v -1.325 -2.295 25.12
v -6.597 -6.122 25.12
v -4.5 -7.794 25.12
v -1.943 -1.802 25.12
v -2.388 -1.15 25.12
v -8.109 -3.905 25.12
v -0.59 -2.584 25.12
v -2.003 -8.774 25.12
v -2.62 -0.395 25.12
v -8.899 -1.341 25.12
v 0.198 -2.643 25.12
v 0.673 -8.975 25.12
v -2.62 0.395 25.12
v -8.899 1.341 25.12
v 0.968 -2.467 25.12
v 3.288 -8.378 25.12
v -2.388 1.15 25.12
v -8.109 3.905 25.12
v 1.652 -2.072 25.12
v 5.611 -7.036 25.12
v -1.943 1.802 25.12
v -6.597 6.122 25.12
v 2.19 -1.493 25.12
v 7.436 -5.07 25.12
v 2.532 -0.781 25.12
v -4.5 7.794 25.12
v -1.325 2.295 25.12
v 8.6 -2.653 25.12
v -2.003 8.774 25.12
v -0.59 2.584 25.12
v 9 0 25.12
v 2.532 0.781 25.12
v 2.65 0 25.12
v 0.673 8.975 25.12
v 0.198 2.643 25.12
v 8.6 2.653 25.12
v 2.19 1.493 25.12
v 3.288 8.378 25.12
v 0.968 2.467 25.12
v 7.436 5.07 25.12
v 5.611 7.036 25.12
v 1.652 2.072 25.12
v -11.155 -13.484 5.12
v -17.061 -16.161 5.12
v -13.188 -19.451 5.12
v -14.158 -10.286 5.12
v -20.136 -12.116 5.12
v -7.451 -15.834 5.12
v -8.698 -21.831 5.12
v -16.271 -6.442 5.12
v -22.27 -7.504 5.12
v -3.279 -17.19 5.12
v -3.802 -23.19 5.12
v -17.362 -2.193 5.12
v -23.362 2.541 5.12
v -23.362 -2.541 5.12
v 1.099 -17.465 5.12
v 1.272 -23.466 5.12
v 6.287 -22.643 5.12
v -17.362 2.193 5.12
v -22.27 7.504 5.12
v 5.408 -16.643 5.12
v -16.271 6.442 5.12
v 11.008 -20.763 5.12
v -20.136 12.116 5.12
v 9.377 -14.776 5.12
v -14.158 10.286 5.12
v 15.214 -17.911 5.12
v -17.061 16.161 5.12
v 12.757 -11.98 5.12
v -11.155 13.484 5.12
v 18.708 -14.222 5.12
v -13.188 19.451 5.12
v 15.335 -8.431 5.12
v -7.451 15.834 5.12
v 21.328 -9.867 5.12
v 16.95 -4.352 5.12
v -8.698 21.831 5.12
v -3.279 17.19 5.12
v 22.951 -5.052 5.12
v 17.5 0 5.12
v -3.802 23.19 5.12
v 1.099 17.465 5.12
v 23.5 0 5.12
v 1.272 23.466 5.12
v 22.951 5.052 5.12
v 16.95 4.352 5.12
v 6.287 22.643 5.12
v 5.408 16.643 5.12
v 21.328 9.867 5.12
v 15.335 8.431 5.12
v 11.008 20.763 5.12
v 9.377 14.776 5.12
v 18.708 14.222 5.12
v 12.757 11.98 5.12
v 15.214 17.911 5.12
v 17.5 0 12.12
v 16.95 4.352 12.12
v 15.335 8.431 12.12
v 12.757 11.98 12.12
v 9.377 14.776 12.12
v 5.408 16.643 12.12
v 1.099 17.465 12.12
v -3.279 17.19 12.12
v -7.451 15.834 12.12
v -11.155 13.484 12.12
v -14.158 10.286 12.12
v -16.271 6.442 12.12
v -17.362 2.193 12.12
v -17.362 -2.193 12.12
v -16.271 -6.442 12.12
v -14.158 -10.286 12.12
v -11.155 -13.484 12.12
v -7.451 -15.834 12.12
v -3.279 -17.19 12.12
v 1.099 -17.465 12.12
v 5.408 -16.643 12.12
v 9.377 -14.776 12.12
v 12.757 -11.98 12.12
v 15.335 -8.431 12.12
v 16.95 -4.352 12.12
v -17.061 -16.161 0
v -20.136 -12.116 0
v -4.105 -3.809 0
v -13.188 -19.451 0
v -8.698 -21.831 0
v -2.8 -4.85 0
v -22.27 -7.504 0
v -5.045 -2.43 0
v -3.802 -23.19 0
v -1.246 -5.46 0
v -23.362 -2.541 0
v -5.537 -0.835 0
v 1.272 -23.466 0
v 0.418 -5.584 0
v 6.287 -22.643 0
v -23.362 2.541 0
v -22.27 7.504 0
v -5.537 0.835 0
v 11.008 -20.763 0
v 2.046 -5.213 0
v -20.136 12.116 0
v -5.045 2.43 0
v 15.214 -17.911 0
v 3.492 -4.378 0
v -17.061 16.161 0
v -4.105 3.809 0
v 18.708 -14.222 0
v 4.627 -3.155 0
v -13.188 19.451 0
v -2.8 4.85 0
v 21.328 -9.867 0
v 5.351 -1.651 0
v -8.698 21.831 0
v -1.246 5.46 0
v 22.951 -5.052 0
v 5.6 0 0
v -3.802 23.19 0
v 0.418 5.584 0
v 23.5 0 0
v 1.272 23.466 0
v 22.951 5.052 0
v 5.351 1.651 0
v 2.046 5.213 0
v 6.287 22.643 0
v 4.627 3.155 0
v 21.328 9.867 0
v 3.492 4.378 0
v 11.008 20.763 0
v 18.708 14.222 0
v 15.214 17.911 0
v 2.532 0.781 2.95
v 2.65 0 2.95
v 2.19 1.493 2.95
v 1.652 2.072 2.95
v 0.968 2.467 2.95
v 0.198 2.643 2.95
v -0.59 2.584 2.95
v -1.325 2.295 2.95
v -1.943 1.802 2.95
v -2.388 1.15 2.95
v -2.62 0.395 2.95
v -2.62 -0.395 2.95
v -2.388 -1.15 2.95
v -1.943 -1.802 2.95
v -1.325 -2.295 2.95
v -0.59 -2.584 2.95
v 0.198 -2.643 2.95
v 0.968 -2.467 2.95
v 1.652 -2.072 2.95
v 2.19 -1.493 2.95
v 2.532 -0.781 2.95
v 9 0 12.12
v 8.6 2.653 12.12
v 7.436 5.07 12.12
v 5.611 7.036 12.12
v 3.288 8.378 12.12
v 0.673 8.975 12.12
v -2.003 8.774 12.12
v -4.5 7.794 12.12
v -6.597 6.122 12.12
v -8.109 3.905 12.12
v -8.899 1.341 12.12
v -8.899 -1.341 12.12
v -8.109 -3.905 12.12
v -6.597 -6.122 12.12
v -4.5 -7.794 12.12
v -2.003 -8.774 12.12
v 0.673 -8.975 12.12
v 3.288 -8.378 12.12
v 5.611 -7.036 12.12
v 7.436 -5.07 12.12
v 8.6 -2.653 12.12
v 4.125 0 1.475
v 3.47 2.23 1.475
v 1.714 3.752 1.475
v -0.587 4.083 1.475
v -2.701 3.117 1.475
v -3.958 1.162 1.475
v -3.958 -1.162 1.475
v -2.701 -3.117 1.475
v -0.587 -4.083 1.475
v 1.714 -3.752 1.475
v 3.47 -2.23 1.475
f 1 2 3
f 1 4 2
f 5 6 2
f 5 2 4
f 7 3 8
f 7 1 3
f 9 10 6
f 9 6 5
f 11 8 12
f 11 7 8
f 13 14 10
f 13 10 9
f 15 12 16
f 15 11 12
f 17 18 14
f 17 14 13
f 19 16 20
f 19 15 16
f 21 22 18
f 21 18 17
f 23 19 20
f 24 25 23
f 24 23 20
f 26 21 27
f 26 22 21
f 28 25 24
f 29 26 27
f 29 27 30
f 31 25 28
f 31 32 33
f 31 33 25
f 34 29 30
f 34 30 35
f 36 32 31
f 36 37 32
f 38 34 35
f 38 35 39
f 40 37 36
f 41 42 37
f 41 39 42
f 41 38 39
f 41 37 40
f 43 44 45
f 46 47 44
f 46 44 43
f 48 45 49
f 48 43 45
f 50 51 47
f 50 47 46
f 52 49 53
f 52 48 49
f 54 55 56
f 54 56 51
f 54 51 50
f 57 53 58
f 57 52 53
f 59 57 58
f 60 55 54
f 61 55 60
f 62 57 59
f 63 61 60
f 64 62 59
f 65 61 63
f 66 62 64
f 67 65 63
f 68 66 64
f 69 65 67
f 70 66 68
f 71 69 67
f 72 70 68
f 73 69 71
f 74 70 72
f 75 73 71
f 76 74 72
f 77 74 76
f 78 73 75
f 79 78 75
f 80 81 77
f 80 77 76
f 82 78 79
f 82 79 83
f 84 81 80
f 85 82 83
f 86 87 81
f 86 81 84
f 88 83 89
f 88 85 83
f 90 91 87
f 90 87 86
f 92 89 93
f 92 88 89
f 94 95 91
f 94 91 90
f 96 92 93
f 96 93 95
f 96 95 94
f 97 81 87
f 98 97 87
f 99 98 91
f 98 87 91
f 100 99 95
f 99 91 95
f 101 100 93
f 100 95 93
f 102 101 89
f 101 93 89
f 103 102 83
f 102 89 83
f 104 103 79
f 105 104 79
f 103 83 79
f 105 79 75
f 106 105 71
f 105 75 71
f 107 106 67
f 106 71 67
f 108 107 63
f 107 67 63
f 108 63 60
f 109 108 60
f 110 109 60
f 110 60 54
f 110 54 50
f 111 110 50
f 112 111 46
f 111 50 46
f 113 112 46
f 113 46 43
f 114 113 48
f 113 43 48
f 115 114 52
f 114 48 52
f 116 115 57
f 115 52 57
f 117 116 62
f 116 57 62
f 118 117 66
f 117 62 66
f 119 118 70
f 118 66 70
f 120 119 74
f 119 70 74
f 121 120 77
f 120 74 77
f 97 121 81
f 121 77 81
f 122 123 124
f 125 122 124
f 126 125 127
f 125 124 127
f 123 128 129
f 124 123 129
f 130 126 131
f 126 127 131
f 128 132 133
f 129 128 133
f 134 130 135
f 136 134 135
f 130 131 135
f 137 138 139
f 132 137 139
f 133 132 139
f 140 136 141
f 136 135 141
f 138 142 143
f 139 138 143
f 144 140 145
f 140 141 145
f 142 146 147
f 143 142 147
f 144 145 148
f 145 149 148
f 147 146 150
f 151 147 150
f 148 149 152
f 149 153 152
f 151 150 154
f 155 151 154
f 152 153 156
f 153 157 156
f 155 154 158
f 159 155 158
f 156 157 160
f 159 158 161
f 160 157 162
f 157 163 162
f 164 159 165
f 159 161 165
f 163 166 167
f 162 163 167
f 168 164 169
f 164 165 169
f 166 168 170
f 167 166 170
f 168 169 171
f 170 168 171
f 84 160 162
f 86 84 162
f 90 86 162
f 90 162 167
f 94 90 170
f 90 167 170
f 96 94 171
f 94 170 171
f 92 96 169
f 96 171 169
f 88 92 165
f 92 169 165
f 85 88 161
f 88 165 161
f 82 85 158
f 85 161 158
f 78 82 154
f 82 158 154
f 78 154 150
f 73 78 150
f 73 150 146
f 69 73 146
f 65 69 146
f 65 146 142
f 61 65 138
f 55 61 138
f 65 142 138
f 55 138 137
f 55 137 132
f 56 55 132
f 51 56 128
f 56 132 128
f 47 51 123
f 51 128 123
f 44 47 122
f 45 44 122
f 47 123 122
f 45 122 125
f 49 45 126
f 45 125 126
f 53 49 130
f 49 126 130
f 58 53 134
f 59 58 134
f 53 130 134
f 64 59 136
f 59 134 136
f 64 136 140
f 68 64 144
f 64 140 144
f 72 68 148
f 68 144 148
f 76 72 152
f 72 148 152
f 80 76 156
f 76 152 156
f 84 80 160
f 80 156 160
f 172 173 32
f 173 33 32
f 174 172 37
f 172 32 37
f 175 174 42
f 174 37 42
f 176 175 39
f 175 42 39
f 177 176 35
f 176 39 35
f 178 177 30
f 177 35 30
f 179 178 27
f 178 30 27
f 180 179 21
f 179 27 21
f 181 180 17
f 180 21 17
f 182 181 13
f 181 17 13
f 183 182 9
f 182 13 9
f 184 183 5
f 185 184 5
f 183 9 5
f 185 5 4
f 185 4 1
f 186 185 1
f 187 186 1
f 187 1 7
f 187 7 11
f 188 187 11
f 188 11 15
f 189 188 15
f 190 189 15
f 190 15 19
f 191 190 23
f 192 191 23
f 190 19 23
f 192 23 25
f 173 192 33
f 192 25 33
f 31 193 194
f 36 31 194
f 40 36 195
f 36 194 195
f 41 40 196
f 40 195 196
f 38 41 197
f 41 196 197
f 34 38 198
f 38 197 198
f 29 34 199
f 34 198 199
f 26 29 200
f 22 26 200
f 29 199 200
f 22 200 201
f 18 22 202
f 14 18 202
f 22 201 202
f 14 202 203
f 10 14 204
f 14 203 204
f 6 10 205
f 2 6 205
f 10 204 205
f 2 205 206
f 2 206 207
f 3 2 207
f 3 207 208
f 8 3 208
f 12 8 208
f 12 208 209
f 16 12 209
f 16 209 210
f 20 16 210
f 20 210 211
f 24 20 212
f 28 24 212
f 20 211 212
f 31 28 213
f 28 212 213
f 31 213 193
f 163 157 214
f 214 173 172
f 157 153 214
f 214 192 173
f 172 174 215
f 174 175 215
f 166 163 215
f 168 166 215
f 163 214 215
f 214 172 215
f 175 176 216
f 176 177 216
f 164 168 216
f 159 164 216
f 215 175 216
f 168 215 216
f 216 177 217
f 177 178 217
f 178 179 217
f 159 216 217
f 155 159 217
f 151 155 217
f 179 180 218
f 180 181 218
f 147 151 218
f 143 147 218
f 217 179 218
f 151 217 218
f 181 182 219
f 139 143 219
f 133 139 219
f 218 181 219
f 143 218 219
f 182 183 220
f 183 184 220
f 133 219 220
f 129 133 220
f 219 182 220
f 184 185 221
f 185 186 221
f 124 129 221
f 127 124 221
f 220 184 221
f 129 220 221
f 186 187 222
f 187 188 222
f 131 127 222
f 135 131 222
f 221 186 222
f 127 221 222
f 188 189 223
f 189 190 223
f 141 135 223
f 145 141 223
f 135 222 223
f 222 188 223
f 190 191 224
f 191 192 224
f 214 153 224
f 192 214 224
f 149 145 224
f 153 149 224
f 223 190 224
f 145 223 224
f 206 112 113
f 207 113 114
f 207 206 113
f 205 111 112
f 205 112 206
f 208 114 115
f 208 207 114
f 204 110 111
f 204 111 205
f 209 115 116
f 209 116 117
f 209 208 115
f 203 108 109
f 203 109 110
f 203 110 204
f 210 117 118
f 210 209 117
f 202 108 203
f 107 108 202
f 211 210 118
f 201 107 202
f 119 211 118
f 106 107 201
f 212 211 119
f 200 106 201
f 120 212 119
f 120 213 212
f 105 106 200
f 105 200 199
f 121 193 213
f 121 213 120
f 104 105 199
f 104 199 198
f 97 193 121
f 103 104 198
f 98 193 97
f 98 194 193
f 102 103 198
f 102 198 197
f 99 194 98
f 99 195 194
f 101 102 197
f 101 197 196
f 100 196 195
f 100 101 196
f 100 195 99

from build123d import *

# Parameters (mm, degrees)
SKETCH1_R                     = 23.5
BOSS_EXTRUDE1_DEPTH           = 5.12
SKETCH2_R                     = 17.5
BOSS_EXTRUDE2_DEPTH           = 7
SKETCH3_R                     = 9
BOSS_EXTRUDE3_DEPTH           = 13
CSK_FOR_M5_SFHCS1_D           = 5.3
CSK_FOR_M5_SFHCS1_CSINK_D     = 11.2
CSK_FOR_M5_SFHCS1_CSINK_ANGLE = 90


with BuildPart() as part:
    # Sketch1 → Boss-Extrude1 (new body)
    with BuildSketch(Plane.XY):
        Circle(SKETCH1_R)
    extrude(amount=BOSS_EXTRUDE1_DEPTH)

    # Sketch2 → Boss-Extrude2 (add)
    with BuildSketch(Plane.XY.offset(5.12)):
        Circle(SKETCH2_R)
    extrude(amount=BOSS_EXTRUDE2_DEPTH)

    # Sketch3 → Boss-Extrude3 (add)
    with BuildSketch(Plane.XY.offset(12.12)):
        Circle(SKETCH3_R)
    extrude(amount=BOSS_EXTRUDE3_DEPTH)

    # CSK for M5 SFHCS1 (through all)
    with Locations(Plane(origin=(0, 0, 0), x_dir=(-1, 0, 0), z_dir=(0, 0, -1))):
        with Locations((0, 0)):
            CounterSinkHole(CSK_FOR_M5_SFHCS1_D / 2, CSK_FOR_M5_SFHCS1_CSINK_D / 2, counter_sink_angle=CSK_FOR_M5_SFHCS1_CSINK_ANGLE)


solid = part.part
